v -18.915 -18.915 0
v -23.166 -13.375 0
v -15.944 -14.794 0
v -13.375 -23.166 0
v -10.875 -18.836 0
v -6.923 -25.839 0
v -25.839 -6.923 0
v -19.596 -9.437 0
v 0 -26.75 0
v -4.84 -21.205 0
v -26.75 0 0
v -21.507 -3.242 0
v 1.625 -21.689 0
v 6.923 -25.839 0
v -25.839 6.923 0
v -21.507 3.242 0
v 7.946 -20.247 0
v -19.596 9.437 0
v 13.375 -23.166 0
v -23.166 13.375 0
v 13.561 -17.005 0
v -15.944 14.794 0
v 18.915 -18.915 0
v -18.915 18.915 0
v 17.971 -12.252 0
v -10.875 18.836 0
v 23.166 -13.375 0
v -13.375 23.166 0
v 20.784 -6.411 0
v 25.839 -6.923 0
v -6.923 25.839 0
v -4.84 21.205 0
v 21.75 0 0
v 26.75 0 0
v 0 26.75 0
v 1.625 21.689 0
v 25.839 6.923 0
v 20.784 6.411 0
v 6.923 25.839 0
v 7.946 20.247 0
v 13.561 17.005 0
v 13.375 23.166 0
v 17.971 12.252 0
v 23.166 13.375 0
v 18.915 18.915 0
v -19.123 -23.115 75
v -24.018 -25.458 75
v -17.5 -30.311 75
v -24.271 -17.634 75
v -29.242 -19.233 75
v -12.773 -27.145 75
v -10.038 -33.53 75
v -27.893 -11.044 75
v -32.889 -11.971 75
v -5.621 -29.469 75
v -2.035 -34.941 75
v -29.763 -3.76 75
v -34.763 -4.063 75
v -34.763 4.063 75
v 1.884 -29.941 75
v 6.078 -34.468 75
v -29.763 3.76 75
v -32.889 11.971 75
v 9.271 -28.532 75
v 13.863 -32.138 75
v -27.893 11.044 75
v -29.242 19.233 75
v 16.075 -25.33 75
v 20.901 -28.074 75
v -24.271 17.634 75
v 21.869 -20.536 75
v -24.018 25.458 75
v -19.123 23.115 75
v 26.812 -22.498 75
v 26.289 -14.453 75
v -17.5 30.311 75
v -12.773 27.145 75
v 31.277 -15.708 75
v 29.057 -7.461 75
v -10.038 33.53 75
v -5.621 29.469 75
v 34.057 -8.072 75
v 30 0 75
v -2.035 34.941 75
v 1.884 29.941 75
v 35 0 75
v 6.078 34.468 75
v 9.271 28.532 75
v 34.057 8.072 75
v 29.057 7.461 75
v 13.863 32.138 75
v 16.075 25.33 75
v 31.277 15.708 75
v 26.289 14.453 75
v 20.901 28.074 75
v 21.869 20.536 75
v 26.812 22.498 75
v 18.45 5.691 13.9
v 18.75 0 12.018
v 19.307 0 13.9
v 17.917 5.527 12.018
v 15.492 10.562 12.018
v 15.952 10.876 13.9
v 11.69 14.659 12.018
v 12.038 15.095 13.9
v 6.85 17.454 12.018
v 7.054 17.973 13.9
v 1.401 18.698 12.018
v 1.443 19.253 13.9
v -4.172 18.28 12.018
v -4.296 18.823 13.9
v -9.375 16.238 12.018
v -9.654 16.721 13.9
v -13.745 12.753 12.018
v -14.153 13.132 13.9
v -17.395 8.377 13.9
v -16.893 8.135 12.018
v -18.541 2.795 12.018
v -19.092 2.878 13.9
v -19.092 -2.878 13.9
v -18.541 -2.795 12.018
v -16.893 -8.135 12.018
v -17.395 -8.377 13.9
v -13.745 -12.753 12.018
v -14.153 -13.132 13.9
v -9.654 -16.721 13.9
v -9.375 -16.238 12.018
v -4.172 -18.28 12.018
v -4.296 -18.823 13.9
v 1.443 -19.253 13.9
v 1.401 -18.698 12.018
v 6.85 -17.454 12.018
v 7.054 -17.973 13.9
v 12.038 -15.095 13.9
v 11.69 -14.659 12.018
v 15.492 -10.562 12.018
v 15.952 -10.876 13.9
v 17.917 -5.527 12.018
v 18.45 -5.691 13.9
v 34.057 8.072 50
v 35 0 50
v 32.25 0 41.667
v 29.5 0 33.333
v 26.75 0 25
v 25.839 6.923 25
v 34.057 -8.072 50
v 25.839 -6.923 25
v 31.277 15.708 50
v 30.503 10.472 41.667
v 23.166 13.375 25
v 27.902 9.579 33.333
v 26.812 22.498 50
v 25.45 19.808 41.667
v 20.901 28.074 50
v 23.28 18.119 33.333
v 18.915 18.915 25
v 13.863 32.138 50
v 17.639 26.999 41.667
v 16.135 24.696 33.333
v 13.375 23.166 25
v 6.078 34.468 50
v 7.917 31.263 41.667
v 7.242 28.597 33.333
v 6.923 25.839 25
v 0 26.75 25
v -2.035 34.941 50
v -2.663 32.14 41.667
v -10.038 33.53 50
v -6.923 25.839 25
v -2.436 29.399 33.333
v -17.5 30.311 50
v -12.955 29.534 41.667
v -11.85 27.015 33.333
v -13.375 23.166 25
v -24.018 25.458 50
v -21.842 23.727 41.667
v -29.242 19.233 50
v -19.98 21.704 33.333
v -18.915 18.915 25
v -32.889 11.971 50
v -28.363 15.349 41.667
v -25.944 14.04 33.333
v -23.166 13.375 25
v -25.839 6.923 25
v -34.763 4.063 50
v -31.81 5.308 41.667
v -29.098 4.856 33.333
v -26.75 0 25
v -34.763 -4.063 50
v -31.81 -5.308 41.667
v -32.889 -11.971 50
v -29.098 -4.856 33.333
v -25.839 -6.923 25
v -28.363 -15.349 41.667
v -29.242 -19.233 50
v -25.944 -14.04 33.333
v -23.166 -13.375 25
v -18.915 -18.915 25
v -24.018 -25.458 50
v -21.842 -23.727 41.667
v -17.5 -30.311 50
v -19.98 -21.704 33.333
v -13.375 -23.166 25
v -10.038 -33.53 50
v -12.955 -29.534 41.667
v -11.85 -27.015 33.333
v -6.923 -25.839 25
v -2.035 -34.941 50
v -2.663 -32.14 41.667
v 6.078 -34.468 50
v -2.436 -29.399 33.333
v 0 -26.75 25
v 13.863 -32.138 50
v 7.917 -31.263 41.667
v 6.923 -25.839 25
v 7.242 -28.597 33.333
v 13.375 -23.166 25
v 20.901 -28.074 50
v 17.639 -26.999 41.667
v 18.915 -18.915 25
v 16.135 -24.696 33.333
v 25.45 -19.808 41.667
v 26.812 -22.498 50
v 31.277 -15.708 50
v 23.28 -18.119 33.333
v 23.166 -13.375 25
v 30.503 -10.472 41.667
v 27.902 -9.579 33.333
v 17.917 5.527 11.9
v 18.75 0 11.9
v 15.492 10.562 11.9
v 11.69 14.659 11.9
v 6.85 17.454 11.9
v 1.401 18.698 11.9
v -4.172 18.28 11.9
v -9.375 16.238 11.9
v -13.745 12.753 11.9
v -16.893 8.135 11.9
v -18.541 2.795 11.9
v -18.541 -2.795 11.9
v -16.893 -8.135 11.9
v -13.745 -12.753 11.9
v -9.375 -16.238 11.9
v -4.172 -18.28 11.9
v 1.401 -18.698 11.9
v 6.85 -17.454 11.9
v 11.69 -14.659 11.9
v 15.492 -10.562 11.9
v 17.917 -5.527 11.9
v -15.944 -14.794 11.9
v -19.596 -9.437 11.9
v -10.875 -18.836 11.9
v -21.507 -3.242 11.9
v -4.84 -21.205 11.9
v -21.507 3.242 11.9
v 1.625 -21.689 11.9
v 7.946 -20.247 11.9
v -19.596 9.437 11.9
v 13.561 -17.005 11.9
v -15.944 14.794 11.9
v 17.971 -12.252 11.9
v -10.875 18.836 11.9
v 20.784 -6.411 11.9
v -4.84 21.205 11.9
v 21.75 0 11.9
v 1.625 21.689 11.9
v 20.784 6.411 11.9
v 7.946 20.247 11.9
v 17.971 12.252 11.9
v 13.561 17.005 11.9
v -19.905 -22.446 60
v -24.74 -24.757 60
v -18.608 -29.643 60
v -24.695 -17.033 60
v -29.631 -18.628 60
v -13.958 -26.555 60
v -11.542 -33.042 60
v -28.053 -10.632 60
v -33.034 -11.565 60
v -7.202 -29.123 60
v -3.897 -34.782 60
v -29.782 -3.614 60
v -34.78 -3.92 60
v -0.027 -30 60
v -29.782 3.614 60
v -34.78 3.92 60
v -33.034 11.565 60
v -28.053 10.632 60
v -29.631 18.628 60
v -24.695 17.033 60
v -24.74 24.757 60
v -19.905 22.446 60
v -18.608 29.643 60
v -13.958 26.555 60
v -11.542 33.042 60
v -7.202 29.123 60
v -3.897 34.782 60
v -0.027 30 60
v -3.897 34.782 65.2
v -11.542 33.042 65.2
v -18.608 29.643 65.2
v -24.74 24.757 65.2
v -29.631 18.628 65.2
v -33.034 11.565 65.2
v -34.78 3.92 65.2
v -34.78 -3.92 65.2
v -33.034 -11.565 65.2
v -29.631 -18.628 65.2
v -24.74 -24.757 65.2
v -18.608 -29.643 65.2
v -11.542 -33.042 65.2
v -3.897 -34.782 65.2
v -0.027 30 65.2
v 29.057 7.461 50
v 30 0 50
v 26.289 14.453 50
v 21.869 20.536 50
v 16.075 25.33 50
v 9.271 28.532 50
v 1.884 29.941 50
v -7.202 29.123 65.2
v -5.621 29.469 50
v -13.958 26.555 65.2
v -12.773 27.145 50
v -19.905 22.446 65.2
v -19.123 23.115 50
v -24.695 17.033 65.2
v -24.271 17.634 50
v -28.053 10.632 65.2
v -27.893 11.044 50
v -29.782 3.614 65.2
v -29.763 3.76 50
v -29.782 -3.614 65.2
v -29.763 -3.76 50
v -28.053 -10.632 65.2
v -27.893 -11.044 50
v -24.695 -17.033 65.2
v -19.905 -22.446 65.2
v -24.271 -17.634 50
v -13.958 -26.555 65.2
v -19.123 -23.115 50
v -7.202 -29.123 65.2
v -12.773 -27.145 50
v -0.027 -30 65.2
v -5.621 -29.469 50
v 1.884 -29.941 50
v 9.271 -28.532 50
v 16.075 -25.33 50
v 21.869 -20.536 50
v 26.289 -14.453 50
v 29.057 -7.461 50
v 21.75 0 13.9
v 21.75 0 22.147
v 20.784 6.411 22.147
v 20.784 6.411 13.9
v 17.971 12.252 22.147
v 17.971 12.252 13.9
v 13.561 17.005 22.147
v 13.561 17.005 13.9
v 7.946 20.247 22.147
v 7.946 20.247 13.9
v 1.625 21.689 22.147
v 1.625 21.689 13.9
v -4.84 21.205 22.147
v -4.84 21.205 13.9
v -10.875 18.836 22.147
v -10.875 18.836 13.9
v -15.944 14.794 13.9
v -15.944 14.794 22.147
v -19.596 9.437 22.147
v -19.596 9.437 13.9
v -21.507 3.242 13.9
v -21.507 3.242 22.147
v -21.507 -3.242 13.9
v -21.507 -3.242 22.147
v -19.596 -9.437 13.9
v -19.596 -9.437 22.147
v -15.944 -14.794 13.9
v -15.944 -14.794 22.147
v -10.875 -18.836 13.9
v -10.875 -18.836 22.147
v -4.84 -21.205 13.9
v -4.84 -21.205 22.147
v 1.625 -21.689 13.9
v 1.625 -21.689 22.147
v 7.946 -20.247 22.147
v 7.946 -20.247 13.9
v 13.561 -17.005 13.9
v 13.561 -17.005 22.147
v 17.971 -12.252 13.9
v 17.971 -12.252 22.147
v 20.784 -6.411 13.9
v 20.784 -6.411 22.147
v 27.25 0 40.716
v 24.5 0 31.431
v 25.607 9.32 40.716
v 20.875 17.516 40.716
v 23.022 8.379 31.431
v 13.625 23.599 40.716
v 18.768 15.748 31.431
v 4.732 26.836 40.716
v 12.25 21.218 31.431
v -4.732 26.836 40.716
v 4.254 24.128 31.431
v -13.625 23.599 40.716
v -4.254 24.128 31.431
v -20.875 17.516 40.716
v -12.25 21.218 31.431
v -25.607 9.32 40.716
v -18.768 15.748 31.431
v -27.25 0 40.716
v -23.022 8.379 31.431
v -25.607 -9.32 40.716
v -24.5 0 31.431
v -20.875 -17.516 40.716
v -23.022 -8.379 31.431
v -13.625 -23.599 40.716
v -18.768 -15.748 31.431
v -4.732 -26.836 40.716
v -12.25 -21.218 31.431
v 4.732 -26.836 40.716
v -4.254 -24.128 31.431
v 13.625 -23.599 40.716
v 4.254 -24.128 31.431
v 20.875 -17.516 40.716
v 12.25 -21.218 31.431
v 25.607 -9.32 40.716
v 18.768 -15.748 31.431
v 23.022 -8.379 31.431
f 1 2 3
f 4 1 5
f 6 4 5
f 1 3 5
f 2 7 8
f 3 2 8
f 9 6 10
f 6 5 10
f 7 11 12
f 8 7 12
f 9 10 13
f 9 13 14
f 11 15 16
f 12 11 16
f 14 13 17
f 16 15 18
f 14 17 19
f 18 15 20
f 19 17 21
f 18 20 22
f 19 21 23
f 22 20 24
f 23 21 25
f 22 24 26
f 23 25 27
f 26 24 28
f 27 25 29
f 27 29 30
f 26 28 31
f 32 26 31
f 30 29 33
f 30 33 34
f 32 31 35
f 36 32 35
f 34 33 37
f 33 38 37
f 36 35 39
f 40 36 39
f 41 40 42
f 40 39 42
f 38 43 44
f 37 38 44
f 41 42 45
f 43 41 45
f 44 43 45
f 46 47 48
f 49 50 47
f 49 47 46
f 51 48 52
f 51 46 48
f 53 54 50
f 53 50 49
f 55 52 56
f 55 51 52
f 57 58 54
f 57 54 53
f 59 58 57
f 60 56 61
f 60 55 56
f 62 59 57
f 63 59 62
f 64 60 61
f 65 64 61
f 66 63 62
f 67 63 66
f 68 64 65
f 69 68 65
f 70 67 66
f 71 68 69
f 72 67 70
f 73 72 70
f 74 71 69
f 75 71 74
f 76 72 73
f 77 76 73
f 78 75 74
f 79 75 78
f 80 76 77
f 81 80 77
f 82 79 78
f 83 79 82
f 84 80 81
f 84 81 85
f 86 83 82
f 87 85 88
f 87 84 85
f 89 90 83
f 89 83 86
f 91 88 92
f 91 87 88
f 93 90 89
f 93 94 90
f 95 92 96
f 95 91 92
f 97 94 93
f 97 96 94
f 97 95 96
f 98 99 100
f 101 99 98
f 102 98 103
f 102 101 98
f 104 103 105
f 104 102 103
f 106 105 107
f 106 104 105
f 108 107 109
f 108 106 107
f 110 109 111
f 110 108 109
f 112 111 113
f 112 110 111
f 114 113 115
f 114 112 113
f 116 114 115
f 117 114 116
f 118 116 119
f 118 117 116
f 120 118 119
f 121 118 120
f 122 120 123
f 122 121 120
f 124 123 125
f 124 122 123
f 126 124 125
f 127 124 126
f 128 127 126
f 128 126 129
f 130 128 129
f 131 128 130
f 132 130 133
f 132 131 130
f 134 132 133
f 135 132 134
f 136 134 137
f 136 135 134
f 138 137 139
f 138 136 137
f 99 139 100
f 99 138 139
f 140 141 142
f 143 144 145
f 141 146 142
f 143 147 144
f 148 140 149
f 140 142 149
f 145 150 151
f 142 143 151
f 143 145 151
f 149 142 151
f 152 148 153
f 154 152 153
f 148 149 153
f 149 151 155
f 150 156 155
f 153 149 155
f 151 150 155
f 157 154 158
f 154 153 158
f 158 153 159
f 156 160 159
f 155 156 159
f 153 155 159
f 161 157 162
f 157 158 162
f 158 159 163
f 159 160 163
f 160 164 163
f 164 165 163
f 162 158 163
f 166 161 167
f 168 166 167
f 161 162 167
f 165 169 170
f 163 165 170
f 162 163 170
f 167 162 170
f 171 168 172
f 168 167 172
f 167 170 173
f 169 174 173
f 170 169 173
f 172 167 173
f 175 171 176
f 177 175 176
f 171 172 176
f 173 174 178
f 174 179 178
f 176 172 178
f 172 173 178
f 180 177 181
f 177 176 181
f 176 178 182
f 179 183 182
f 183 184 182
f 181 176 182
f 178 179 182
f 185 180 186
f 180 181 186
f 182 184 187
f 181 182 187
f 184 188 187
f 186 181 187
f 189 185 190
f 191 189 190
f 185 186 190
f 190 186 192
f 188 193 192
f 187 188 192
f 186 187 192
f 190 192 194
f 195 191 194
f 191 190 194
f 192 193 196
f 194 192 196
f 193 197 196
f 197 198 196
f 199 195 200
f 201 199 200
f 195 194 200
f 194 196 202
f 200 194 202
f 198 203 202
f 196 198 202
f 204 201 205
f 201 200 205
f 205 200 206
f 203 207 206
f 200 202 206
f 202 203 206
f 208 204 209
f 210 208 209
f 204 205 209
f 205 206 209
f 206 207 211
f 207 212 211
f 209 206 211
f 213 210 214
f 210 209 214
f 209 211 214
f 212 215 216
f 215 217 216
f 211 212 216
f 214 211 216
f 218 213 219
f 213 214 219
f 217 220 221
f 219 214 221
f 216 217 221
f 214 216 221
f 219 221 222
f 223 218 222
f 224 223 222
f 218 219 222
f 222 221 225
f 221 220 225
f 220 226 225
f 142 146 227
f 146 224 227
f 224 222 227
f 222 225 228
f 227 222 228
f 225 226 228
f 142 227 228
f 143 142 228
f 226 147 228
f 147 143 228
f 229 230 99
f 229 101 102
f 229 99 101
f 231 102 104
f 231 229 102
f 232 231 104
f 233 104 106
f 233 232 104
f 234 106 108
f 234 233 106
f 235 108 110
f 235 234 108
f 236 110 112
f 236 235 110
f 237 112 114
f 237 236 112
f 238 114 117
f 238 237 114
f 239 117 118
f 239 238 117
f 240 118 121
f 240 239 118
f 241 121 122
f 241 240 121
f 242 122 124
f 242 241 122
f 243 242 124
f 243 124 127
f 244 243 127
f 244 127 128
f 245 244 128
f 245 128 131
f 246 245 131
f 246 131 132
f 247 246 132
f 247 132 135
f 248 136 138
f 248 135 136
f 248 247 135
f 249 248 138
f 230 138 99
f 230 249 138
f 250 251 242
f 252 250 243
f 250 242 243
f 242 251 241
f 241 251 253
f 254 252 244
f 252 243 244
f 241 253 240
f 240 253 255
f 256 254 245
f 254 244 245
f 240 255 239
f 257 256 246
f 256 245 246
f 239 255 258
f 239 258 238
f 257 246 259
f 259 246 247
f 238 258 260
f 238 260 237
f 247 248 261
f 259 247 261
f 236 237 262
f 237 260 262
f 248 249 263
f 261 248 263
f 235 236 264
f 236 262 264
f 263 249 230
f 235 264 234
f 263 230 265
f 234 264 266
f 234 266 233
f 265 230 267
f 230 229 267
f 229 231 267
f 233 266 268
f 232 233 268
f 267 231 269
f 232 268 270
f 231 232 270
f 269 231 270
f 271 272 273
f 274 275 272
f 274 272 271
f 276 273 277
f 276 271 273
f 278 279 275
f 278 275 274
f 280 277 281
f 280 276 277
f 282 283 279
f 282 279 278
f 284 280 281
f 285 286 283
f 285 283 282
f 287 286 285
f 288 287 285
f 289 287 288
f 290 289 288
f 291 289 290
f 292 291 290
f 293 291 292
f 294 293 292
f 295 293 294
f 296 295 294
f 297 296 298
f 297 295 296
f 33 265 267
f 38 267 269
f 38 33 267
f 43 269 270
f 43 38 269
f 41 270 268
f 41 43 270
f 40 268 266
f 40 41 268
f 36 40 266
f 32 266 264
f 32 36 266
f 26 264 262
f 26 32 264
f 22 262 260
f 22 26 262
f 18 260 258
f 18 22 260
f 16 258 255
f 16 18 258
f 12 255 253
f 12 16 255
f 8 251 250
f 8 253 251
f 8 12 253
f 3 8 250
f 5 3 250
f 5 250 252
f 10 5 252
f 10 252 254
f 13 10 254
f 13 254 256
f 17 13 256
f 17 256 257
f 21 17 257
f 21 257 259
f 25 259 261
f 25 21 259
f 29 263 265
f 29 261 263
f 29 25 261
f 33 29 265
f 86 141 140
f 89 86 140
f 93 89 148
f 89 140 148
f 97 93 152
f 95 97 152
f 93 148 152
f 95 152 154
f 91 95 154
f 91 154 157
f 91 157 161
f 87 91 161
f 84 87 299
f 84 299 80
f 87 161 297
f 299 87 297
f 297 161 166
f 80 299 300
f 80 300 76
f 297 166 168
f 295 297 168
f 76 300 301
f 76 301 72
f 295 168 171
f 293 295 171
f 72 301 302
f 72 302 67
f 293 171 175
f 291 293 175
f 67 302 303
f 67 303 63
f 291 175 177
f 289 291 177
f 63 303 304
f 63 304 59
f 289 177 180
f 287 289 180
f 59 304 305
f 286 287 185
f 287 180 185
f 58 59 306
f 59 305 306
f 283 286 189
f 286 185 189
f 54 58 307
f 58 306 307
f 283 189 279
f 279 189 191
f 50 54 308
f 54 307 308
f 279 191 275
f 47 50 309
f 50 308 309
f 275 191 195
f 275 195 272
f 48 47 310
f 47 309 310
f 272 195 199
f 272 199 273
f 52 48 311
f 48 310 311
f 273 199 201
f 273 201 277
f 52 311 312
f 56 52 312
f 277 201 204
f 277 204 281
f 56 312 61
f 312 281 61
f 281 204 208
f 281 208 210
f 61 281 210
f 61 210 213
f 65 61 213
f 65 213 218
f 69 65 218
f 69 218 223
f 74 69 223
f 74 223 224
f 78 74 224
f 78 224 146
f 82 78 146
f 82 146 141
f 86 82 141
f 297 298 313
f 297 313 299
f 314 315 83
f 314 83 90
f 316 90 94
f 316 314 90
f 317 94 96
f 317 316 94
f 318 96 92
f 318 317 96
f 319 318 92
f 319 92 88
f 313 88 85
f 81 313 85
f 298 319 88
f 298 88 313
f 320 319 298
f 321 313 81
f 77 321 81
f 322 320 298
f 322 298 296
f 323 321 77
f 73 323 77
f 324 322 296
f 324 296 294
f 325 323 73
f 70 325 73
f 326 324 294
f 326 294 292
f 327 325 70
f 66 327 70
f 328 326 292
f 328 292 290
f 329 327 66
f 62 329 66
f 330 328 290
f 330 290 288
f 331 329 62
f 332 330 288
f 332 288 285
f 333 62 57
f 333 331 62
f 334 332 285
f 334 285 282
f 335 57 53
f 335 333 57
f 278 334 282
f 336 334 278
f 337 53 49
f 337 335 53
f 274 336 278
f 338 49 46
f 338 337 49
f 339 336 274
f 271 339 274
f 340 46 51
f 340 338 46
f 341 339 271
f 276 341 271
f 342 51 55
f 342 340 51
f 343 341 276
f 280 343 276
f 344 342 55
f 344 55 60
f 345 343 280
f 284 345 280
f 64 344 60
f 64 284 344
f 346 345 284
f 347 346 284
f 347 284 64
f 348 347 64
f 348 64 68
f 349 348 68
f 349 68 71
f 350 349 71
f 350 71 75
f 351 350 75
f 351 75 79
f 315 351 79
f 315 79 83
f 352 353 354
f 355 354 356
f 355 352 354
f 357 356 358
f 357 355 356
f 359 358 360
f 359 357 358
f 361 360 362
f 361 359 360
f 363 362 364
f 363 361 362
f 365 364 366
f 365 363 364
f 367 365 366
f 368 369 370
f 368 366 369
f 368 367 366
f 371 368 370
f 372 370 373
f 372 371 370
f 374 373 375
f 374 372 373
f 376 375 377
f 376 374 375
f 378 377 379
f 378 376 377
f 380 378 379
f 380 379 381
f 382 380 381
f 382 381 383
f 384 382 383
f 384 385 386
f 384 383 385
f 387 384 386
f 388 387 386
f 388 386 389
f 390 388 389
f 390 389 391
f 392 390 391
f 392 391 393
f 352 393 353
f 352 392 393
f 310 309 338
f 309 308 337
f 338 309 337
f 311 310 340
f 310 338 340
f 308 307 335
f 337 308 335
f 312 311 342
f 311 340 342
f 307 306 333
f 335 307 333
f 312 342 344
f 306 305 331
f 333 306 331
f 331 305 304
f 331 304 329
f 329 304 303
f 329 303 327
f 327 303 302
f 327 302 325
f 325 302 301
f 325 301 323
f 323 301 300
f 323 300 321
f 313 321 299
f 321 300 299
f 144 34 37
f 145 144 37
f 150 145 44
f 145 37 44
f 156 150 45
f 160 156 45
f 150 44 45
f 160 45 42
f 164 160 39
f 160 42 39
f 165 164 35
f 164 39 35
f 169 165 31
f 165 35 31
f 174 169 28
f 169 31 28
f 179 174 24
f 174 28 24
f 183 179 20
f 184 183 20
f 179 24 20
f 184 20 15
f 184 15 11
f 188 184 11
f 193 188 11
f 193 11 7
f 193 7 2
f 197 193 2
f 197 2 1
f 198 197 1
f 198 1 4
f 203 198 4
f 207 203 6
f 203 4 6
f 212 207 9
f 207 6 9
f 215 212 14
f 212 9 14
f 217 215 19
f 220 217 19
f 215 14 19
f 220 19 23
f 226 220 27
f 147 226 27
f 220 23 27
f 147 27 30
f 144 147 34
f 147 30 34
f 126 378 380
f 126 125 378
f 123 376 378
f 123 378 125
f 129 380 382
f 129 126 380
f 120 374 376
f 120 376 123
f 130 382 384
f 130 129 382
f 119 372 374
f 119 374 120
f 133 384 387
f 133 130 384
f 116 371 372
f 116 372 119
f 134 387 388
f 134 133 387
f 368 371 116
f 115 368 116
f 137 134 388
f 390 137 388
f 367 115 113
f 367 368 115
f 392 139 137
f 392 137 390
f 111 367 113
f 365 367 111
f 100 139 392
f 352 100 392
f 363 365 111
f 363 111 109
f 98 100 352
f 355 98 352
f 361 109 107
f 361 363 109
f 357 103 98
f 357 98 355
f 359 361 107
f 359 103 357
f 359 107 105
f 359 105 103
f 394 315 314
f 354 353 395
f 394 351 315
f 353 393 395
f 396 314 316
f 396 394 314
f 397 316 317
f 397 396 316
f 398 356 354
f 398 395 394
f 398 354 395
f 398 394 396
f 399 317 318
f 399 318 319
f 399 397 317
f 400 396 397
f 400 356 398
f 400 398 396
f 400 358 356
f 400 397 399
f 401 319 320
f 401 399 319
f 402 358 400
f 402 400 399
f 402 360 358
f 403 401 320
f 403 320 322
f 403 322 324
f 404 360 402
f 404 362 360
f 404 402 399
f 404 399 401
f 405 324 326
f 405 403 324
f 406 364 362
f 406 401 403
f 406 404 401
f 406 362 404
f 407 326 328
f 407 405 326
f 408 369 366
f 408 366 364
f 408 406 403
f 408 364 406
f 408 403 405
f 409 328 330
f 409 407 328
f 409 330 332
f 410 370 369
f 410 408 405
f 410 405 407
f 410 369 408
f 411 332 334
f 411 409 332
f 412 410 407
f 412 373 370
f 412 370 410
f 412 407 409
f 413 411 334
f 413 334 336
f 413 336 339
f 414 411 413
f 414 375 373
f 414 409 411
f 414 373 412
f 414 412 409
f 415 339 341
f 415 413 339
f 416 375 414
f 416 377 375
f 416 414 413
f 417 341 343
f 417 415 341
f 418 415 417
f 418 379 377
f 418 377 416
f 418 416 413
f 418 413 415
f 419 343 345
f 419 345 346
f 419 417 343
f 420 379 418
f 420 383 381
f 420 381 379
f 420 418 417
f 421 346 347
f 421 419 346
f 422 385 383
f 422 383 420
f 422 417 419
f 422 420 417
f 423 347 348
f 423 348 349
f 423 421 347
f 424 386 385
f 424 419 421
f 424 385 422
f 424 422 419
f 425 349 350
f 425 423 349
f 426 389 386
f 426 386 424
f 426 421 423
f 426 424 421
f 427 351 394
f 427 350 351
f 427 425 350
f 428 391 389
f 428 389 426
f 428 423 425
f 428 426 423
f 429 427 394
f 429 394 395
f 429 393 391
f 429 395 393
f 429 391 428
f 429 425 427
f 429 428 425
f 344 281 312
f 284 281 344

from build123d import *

# Parameters (mm, degrees)
F0_R      = 26.75
F0_R_2    = 21.75
F1_DEPTH  = 25
F3_R      = 22.935905
F3_R_2    = 18.75
F4_DEPTH  = 2
F6_R      = 35
F7_R      = 26.75
F9_R      = 30
F10_R     = 18.714906
F12_R     = 35
F12_R_2   = 30
F13_DEPTH = 25
F16_DEPTH = 5.2


with BuildPart() as f1:
    # F0 (on Top) → F1 (new body)
    with BuildSketch(Plane.XY):
        Circle(F0_R)
        Circle(F0_R_2, mode=Mode.SUBTRACT)
    extrude(amount=F1_DEPTH)

    # F3 (on offset) → F4 (join)
    with BuildSketch(Plane.XY.offset(11.9)):
        Circle(F3_R)
        Circle(F3_R_2, mode=Mode.SUBTRACT)
    extrude(amount=F4_DEPTH)

    # F6 (on offset) → F8 section 0
    with BuildSketch(Plane.XY.offset(50)):
        Circle(F6_R)
    # F7 (on face) → F8 section 1
    with BuildSketch(Plane.XY.offset(25)):
        Circle(F7_R)
    loft()

    # F9 (on face) → F11 section 0
    with BuildSketch(Plane.XY.offset(50)):
        Circle(F9_R)
    # F10 (on face) → F11 section 1
    with BuildSketch(Plane(origin=(0, 0, 11.9), x_dir=(1, 0, 0), z_dir=(0, 0, -1))):
        Circle(F10_R)
    loft(mode=Mode.SUBTRACT)

    # F12 (on face) → F13 (join)
    with BuildSketch(Plane.XY.offset(50)):
        Circle(F12_R)
        Circle(F12_R_2, mode=Mode.SUBTRACT)
    extrude(amount=F13_DEPTH)

    # F15 (on offset) → F16 (cut)
    with BuildSketch(Plane.XY.offset(60)):
        with BuildLine():
            Line((-0.026878, 29.999988), (-3.897005, 34.782371))
            ThreePointArc((-3.897005, 34.782371), (-35, 0), (-3.897005, -34.782371))
            Line((-3.897005, -34.782371), (-0.026878, -29.999988))
            ThreePointArc((-0.026878, -29.999988), (-30, 0), (-0.026878, 29.999988))
        make_face()
        with BuildLine():
            Line((-0.026878, -29.999988), (-0.026878, 29.999988))
            ThreePointArc((-0.026878, 29.999988), (-30, 0), (-0.026878, -29.999988))
        make_face()
    extrude(amount=F16_DEPTH, mode=Mode.SUBTRACT)


solid = f1.part
